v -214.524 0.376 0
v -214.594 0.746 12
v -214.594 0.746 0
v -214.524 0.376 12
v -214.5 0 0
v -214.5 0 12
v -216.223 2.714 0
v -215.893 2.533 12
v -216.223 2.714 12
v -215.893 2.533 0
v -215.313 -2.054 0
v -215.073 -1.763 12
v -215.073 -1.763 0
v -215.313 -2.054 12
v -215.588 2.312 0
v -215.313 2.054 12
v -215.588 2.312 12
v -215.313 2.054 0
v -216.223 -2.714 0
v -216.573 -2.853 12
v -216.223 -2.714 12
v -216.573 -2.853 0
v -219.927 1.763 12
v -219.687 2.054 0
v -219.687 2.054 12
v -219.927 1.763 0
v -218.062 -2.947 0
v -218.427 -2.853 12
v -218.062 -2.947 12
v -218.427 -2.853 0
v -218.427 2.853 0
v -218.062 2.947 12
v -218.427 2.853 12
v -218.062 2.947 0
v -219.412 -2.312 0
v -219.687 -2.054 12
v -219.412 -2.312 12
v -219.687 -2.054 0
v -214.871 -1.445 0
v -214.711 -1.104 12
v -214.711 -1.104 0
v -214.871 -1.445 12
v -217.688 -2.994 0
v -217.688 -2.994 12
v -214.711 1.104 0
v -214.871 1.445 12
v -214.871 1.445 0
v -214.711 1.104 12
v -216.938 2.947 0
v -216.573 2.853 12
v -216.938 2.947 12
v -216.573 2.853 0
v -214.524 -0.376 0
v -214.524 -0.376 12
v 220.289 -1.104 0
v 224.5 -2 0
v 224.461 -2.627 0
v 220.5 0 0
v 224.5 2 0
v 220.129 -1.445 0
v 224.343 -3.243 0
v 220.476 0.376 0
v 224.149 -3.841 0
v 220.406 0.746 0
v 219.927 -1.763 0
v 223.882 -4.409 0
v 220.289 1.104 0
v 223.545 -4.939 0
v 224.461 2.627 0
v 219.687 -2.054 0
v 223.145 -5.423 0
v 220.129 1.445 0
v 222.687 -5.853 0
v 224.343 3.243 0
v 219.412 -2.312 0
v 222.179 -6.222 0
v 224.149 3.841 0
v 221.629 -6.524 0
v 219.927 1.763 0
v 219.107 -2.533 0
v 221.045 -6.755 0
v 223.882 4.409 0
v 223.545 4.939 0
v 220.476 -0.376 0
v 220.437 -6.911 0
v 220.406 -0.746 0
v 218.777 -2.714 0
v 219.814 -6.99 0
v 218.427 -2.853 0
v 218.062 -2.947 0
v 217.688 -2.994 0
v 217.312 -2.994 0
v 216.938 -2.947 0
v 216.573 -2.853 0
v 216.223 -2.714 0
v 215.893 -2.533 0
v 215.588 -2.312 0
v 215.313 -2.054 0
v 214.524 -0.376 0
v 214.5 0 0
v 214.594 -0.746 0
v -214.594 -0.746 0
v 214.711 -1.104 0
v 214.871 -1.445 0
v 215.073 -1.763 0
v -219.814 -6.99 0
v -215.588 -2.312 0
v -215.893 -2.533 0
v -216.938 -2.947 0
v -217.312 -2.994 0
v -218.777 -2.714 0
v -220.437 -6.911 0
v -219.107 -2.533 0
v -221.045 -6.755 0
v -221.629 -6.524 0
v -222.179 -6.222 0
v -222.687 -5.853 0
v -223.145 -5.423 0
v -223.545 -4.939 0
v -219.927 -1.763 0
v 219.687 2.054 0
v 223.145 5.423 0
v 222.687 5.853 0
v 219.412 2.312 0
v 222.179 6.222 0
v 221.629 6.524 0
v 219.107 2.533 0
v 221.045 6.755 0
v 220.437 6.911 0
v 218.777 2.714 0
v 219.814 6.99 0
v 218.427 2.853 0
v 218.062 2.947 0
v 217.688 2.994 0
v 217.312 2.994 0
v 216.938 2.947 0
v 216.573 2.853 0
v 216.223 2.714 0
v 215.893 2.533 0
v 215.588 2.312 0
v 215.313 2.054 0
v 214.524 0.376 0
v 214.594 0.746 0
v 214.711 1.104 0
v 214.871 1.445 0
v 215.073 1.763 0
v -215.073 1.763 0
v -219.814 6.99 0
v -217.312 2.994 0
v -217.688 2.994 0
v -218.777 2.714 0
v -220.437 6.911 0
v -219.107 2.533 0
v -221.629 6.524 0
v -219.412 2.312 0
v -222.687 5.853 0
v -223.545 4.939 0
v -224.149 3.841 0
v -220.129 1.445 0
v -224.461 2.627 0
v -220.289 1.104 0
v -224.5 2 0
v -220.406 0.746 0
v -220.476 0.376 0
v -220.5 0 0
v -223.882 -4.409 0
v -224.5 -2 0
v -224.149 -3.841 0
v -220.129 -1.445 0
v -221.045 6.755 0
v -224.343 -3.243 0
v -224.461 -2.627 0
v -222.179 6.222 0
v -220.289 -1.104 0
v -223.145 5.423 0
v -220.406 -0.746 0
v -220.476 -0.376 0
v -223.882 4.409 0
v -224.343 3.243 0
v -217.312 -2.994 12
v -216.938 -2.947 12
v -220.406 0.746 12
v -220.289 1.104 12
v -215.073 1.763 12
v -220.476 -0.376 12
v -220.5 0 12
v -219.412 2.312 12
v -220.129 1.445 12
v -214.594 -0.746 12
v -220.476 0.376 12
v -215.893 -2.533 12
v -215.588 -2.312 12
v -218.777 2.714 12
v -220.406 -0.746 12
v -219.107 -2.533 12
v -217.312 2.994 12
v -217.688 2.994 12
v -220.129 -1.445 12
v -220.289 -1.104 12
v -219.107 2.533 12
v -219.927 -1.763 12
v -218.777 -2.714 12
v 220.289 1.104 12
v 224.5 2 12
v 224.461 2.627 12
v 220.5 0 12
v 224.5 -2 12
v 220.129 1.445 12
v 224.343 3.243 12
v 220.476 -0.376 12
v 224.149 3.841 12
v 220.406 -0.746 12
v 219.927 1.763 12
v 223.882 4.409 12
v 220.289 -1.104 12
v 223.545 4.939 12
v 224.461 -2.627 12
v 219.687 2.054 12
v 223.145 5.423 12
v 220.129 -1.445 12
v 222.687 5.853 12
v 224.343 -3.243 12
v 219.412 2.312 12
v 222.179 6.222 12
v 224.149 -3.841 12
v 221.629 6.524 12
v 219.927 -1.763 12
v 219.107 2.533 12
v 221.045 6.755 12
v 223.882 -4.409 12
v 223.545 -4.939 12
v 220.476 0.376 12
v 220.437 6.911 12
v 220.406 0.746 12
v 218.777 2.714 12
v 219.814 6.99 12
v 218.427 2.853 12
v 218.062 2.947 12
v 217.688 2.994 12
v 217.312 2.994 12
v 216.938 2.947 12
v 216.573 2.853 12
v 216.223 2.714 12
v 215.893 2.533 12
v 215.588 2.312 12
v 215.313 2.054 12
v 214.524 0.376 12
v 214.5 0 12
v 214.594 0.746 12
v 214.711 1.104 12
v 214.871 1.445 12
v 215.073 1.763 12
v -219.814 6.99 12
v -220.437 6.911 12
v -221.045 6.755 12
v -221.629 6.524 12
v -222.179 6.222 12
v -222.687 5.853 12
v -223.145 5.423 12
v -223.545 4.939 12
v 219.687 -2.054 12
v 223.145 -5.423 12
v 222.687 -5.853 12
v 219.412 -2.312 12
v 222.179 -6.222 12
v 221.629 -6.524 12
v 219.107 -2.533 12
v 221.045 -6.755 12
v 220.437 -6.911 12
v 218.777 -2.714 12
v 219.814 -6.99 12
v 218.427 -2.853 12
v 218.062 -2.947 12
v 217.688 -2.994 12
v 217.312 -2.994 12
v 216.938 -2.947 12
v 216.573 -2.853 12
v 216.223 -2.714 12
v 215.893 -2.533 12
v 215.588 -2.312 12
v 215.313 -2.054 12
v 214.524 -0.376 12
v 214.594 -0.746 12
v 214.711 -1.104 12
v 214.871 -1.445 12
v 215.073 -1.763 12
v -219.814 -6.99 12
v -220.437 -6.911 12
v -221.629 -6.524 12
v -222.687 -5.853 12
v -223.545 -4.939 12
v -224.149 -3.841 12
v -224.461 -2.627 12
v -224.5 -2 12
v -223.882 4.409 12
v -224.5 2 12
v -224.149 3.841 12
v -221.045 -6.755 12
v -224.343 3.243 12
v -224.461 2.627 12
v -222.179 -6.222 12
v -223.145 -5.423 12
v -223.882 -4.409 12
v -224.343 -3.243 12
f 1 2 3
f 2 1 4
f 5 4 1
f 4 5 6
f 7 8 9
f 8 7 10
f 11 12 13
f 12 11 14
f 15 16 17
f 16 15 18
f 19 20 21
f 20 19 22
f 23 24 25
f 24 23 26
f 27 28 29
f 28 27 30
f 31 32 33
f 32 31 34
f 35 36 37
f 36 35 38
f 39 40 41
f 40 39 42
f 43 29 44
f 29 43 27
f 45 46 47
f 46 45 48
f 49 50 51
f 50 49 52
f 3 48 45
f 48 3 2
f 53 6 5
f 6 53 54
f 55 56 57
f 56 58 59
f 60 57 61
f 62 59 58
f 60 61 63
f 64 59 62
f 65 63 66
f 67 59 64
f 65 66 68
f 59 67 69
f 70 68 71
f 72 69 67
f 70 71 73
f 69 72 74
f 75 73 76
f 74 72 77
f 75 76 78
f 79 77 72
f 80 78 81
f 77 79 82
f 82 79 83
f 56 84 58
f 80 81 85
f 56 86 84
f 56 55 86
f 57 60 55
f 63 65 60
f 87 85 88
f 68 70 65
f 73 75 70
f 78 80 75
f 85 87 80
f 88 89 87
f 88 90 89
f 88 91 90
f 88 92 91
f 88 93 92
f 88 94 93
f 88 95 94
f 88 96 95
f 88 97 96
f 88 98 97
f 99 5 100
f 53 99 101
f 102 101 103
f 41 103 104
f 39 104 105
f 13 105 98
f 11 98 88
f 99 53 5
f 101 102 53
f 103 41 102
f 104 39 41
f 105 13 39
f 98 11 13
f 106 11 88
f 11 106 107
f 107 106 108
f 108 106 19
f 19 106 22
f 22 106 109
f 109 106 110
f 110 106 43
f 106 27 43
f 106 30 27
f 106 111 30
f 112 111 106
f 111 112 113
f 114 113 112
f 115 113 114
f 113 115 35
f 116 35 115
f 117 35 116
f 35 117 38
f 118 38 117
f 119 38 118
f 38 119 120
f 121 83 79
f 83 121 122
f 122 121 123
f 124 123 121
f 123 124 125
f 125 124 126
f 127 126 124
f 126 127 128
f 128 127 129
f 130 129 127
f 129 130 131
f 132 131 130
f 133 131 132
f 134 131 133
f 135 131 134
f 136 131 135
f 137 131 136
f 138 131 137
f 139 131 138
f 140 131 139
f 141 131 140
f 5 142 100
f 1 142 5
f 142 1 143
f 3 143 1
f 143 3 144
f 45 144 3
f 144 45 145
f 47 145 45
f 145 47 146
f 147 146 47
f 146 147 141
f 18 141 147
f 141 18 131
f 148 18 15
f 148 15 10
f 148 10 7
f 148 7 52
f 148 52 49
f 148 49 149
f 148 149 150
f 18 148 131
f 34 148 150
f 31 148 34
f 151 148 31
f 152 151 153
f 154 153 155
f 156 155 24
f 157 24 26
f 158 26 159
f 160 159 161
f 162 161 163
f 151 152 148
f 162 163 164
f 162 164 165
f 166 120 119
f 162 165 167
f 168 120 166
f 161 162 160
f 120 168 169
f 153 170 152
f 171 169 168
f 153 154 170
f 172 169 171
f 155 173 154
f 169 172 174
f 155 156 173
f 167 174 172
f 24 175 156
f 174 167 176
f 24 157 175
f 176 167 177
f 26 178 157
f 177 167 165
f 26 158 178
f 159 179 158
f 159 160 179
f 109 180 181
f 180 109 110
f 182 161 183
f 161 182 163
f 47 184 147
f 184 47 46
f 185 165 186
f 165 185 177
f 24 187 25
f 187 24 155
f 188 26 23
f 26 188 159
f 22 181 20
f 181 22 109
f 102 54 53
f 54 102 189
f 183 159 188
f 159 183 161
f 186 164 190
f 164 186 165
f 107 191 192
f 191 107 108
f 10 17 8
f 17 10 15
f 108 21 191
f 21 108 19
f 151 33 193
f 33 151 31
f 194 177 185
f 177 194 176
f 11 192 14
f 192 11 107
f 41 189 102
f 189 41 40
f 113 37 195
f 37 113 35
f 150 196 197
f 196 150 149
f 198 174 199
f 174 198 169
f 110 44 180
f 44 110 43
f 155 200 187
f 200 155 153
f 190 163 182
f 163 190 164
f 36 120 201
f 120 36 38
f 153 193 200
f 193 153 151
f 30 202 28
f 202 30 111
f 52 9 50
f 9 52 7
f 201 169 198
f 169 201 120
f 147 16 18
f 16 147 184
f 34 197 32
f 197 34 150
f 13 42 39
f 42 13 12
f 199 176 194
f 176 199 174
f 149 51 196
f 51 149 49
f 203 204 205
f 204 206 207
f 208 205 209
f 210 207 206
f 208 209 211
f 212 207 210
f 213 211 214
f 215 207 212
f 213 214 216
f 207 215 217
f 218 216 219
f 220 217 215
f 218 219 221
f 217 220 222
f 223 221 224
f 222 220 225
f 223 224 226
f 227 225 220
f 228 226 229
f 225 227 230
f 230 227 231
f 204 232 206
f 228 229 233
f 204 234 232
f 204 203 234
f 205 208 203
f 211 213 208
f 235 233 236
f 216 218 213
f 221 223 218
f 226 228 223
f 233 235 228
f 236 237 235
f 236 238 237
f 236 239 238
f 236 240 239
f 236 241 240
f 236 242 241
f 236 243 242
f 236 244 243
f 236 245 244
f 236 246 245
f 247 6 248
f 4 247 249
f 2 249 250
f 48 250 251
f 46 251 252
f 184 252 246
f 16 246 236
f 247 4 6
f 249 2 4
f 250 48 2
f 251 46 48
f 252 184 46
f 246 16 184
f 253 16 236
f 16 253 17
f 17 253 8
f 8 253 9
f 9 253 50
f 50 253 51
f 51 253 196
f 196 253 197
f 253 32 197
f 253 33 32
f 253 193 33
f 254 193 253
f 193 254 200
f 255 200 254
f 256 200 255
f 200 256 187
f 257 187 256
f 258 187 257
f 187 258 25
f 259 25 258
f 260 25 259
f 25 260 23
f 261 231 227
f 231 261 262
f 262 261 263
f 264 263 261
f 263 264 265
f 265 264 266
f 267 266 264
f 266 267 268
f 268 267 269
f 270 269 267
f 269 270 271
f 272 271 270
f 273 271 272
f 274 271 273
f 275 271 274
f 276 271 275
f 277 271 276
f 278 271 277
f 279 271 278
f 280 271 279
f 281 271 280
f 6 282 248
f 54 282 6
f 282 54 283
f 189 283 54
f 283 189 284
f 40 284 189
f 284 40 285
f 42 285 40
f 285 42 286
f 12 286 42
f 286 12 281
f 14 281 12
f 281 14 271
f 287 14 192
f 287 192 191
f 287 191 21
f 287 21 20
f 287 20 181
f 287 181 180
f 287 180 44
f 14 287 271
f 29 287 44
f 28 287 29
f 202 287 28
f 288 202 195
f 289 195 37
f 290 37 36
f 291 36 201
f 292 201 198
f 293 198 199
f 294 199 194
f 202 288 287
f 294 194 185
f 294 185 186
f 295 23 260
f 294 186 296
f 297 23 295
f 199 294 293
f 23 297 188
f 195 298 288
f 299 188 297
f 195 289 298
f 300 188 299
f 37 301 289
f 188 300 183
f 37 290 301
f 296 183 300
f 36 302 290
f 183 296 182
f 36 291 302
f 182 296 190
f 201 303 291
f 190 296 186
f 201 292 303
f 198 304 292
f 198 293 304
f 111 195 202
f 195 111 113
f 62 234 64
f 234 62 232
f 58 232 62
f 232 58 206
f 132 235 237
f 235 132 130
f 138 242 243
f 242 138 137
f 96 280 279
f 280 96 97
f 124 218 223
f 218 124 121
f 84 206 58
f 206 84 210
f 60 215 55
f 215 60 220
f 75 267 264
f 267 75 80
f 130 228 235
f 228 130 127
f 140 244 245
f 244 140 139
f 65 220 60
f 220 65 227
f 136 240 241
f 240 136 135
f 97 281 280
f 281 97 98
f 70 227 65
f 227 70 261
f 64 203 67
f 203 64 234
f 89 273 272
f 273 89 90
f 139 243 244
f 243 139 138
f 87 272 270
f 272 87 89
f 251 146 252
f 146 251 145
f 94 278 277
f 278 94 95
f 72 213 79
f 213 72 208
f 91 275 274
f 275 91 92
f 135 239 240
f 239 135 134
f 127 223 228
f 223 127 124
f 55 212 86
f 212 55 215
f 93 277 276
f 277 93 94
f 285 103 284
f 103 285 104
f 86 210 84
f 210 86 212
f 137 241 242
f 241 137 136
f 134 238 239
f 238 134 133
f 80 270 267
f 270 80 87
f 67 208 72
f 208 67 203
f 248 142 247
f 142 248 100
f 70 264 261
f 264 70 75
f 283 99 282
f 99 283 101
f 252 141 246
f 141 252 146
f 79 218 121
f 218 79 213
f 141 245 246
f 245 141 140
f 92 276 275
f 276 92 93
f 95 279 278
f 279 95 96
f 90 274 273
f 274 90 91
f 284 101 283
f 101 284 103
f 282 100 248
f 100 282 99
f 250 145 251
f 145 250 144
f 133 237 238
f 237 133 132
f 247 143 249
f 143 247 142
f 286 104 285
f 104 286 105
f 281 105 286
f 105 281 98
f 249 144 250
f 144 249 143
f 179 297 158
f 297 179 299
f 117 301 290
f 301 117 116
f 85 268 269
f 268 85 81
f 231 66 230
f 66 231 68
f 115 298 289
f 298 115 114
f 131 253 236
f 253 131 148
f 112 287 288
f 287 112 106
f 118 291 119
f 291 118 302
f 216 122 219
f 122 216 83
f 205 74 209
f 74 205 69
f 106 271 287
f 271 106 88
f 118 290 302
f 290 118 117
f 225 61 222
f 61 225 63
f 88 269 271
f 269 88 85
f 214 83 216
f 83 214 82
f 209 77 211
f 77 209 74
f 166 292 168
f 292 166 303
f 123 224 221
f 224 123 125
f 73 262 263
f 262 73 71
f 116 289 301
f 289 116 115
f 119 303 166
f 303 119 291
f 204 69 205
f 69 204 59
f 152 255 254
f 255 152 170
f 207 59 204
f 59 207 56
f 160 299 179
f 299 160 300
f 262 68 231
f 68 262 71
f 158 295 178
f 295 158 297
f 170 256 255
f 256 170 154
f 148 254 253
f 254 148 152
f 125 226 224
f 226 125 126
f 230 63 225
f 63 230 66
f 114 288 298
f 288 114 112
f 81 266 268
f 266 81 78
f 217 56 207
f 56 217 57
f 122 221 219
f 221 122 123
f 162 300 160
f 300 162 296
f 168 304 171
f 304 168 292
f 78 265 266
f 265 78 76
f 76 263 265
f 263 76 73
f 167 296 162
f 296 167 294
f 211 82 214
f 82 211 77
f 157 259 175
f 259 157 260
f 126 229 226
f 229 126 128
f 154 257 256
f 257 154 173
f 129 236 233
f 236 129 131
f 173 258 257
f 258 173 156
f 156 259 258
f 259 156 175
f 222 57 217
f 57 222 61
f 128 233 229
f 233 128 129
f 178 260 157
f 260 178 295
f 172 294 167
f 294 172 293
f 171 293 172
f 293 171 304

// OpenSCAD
$fn = 50;


difference() {
	union() {
		hull() {
			translate(v = [-219.5000000000, 2.0000000000, 0]) {
				cylinder(h = 12, r = 5);
			}
			translate(v = [219.5000000000, 2.0000000000, 0]) {
				cylinder(h = 12, r = 5);
			}
			translate(v = [-219.5000000000, -2.0000000000, 0]) {
				cylinder(h = 12, r = 5);
			}
			translate(v = [219.5000000000, -2.0000000000, 0]) {
				cylinder(h = 12, r = 5);
			}
		}
	}
	union() {
		translate(v = [-217.5000000000, 0.0000000000, 0]) {
			cylinder(h = 12, r = 3.0000000000);
		}
		translate(v = [217.5000000000, 0.0000000000, 0]) {
			cylinder(h = 12, r = 3.0000000000);
		}
		translate(v = [-217.5000000000, 0.0000000000, 0]) {
			cylinder(h = 12, r = 1.5000000000);
		}
		translate(v = [217.5000000000, 0.0000000000, 0]) {
			cylinder(h = 12, r = 1.5000000000);
		}
		translate(v = [-217.5000000000, 0.0000000000, 0]) {
			cylinder(h = 12, r = 1.5000000000);
		}
		translate(v = [217.5000000000, 0.0000000000, 0]) {
			cylinder(h = 12, r = 1.5000000000);
		}
		translate(v = [-217.5000000000, 0.0000000000, 0]) {
			cylinder(h = 12, r = 1.5000000000);
		}
		translate(v = [217.5000000000, 0.0000000000, 0]) {
			cylinder(h = 12, r = 1.5000000000);
		}
	}
}
